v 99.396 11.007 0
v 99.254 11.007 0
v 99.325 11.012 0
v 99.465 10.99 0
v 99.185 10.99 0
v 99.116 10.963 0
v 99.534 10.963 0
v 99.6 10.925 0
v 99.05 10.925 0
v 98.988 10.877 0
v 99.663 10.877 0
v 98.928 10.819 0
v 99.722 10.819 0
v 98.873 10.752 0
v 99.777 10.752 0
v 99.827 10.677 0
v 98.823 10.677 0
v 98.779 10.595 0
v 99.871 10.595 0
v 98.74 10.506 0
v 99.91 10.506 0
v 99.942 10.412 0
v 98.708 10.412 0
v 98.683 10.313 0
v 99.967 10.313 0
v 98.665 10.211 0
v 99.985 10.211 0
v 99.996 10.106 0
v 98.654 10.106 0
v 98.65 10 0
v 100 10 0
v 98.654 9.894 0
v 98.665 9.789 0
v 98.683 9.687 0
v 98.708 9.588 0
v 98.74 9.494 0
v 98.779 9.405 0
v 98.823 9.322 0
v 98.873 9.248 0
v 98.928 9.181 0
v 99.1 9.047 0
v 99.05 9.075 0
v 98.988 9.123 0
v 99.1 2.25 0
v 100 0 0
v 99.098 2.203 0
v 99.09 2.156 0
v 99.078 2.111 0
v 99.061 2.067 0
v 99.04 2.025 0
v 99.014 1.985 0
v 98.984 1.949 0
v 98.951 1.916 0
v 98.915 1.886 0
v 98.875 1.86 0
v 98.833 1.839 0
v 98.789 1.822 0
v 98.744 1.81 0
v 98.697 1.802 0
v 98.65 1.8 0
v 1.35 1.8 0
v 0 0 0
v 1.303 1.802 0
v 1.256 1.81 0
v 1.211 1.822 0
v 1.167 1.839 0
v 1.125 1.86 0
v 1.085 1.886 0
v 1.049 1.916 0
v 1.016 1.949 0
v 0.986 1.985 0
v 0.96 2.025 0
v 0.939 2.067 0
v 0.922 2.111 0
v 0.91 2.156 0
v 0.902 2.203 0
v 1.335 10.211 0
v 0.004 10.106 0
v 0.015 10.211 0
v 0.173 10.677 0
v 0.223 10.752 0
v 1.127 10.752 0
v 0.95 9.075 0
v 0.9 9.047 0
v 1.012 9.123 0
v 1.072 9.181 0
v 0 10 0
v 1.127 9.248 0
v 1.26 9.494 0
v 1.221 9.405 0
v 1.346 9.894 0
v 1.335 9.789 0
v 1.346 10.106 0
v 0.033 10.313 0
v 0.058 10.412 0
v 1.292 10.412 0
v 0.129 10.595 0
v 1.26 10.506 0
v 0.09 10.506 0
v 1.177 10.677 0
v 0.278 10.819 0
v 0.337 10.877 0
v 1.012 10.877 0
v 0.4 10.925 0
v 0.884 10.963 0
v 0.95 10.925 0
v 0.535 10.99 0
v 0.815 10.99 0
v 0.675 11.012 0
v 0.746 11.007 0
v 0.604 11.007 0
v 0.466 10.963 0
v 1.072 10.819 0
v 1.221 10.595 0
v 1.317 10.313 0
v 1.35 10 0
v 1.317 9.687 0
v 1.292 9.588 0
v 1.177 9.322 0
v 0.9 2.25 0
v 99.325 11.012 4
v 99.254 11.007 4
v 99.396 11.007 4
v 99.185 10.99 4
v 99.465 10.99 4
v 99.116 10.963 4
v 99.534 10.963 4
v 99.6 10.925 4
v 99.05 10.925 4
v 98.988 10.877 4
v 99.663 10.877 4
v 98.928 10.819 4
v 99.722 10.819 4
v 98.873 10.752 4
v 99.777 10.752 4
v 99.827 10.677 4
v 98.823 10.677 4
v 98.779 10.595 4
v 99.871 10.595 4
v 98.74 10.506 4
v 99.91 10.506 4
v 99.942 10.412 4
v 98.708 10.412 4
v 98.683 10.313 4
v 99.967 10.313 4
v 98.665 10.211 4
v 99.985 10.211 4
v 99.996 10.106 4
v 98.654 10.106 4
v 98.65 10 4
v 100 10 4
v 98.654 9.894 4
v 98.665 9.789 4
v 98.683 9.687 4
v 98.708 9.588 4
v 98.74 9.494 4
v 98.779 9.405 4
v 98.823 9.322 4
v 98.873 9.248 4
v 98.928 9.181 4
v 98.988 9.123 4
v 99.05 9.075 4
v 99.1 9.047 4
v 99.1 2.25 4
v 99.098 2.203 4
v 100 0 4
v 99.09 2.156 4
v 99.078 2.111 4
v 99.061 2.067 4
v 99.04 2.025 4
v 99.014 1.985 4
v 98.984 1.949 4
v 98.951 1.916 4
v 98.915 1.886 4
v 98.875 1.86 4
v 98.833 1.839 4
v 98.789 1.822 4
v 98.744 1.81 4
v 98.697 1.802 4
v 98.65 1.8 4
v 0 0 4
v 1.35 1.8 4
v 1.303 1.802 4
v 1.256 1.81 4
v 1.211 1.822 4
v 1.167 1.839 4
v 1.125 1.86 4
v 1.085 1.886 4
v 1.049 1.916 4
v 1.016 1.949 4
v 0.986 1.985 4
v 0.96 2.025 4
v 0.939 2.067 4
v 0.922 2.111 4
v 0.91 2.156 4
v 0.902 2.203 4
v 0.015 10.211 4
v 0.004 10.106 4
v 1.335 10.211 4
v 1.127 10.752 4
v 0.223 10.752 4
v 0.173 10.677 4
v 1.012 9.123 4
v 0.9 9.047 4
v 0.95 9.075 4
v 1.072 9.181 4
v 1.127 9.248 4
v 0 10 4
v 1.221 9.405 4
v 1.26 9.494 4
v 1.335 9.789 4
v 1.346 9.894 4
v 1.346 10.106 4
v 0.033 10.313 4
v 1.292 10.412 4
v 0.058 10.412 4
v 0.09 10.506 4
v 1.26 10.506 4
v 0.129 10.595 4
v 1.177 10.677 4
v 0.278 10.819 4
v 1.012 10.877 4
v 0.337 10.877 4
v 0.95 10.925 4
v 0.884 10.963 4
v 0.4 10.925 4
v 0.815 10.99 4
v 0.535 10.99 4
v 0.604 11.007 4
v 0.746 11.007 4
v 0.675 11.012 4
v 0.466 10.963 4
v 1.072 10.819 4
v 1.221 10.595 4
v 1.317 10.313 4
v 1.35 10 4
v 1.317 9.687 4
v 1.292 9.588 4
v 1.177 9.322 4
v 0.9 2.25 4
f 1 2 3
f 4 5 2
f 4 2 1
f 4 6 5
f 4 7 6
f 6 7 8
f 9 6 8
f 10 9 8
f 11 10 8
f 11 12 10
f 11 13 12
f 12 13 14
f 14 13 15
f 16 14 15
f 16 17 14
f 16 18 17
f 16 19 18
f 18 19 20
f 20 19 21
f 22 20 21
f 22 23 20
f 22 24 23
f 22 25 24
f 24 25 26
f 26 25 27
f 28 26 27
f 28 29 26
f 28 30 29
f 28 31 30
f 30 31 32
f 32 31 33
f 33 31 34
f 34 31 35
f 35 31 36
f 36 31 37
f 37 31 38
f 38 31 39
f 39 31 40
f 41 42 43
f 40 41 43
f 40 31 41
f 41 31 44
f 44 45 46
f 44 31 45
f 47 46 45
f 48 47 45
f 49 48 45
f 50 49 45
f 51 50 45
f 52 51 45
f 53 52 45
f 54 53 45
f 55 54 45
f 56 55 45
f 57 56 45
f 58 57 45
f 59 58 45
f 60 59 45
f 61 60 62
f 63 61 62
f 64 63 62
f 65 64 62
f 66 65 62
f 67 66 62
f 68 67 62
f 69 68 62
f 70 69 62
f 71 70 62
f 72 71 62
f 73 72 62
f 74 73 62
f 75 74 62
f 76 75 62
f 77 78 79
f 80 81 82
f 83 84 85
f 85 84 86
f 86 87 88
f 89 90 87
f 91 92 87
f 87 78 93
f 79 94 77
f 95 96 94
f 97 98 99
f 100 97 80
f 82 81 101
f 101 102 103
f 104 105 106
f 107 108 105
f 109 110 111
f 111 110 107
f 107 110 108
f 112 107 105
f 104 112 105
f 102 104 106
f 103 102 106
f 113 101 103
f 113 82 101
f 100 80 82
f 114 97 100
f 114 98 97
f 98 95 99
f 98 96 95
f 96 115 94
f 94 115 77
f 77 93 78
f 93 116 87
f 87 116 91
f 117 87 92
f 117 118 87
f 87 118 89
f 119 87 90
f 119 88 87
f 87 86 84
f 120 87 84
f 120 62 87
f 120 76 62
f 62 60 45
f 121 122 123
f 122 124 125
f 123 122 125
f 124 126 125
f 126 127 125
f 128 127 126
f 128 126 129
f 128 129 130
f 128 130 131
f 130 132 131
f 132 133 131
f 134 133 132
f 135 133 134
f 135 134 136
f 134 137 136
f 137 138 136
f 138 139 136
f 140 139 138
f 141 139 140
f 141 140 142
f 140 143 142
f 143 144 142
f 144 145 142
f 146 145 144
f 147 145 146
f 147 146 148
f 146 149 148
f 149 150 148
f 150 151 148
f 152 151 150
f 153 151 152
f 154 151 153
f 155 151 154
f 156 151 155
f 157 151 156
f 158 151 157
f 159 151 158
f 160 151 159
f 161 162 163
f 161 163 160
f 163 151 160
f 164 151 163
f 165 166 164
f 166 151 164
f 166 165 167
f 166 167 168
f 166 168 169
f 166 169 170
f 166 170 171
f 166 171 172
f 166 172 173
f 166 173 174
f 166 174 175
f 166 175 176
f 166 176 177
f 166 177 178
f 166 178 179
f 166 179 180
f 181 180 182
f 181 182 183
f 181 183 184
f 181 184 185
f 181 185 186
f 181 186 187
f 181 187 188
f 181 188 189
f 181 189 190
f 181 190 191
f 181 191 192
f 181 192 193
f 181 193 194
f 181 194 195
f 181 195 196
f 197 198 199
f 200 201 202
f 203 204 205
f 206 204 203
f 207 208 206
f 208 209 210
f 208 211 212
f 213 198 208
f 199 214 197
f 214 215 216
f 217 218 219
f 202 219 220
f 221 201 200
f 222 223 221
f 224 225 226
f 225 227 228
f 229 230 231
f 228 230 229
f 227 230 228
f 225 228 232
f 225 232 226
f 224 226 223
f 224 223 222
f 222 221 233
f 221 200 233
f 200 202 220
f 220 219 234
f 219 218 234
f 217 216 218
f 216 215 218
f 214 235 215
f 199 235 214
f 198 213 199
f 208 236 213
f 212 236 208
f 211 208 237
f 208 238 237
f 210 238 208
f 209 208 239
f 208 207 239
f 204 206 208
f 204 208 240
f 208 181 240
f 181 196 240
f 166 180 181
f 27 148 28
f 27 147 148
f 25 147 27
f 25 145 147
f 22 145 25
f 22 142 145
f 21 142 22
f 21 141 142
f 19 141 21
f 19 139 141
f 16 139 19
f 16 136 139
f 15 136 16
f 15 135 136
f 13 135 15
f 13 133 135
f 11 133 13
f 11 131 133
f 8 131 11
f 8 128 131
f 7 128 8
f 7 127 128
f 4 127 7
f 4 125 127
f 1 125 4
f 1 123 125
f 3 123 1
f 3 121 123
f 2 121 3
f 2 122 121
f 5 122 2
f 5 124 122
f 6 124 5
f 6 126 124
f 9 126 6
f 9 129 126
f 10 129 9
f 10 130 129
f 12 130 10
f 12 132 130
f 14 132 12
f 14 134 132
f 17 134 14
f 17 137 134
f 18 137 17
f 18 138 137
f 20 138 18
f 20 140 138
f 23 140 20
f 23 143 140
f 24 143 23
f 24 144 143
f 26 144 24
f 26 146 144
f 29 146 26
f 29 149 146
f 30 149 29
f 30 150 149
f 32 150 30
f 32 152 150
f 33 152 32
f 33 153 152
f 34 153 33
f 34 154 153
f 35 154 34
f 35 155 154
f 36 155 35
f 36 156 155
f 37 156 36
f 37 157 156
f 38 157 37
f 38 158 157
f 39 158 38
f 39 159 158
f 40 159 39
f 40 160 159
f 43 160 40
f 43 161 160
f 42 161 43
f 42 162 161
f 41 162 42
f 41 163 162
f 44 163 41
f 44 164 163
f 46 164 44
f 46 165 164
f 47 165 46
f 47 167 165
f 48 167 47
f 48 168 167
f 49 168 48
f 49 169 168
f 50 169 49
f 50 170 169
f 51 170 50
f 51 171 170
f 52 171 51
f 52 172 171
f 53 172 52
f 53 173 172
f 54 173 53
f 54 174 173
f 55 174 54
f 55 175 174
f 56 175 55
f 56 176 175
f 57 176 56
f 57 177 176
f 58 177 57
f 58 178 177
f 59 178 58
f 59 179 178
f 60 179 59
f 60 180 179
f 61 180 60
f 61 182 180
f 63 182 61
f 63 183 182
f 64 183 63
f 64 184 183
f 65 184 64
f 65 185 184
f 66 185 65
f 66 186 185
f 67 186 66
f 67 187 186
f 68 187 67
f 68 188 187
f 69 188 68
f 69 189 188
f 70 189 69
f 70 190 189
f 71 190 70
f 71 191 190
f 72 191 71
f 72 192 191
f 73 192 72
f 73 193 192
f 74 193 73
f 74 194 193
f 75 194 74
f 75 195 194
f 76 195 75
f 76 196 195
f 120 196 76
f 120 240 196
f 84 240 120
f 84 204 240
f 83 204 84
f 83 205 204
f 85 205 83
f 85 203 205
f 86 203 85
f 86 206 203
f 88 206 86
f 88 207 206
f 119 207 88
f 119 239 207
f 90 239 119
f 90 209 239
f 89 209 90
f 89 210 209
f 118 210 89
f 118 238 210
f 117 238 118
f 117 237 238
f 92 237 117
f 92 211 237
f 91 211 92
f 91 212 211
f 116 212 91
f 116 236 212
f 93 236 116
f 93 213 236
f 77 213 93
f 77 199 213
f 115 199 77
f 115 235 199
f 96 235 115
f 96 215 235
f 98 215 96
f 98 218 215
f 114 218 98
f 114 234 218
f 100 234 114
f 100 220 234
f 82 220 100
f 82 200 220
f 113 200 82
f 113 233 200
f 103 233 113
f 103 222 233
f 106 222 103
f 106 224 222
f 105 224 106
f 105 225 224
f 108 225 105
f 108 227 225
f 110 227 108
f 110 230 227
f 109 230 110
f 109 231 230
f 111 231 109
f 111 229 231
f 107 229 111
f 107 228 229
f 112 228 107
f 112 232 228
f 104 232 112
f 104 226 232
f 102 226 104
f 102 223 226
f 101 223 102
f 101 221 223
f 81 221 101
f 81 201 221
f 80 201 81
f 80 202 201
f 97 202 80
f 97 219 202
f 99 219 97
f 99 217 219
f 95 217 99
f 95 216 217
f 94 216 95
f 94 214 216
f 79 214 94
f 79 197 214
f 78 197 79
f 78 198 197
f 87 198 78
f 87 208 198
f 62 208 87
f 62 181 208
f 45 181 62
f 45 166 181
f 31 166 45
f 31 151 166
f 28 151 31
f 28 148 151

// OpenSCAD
// Print settings that this model is designed for
layer_height    = 0.25;
extrusion_width = 0.45;

increment_xy = extrusion_width * 2;
increment_z  = layer_height * 4;


$fn = 60;


holder(
    length = 100.0,
    width  = 50.0,
    height = 10.0
);


module holder(length, width, height) {
    base_height  = increment_xy * 2;
    flexer_width = increment_xy;

    linear_extrude(increment_z * 4)
    lengthwise();
    // TASK: Add second lengthwise part.
    // TASK: Add widthwise parts.

    module lengthwise() {
        union() {
            // TASK: Cut out slots for the widthwise parts.
            square([length, base_height]);

            flexer();

            translate([length, 0])
            mirror([1, 0, 0])
            flexer();
        }

        module flexer() {
            total_height = height + extrusion_width;

            union() {
                square([flexer_width, height]);

                d = flexer_width + extrusion_width;
                translate([d / 2, height])
                scale([1, 1.5])
                circle(d = d);

                corner();
            }

            module corner() {
                radius = increment_xy / 2;

                translate([flexer_width, base_height])
                difference() {
                    square([radius, radius]);

                    translate([radius, radius])
                    circle(r = radius);
                }
            }
        }
    }
}
